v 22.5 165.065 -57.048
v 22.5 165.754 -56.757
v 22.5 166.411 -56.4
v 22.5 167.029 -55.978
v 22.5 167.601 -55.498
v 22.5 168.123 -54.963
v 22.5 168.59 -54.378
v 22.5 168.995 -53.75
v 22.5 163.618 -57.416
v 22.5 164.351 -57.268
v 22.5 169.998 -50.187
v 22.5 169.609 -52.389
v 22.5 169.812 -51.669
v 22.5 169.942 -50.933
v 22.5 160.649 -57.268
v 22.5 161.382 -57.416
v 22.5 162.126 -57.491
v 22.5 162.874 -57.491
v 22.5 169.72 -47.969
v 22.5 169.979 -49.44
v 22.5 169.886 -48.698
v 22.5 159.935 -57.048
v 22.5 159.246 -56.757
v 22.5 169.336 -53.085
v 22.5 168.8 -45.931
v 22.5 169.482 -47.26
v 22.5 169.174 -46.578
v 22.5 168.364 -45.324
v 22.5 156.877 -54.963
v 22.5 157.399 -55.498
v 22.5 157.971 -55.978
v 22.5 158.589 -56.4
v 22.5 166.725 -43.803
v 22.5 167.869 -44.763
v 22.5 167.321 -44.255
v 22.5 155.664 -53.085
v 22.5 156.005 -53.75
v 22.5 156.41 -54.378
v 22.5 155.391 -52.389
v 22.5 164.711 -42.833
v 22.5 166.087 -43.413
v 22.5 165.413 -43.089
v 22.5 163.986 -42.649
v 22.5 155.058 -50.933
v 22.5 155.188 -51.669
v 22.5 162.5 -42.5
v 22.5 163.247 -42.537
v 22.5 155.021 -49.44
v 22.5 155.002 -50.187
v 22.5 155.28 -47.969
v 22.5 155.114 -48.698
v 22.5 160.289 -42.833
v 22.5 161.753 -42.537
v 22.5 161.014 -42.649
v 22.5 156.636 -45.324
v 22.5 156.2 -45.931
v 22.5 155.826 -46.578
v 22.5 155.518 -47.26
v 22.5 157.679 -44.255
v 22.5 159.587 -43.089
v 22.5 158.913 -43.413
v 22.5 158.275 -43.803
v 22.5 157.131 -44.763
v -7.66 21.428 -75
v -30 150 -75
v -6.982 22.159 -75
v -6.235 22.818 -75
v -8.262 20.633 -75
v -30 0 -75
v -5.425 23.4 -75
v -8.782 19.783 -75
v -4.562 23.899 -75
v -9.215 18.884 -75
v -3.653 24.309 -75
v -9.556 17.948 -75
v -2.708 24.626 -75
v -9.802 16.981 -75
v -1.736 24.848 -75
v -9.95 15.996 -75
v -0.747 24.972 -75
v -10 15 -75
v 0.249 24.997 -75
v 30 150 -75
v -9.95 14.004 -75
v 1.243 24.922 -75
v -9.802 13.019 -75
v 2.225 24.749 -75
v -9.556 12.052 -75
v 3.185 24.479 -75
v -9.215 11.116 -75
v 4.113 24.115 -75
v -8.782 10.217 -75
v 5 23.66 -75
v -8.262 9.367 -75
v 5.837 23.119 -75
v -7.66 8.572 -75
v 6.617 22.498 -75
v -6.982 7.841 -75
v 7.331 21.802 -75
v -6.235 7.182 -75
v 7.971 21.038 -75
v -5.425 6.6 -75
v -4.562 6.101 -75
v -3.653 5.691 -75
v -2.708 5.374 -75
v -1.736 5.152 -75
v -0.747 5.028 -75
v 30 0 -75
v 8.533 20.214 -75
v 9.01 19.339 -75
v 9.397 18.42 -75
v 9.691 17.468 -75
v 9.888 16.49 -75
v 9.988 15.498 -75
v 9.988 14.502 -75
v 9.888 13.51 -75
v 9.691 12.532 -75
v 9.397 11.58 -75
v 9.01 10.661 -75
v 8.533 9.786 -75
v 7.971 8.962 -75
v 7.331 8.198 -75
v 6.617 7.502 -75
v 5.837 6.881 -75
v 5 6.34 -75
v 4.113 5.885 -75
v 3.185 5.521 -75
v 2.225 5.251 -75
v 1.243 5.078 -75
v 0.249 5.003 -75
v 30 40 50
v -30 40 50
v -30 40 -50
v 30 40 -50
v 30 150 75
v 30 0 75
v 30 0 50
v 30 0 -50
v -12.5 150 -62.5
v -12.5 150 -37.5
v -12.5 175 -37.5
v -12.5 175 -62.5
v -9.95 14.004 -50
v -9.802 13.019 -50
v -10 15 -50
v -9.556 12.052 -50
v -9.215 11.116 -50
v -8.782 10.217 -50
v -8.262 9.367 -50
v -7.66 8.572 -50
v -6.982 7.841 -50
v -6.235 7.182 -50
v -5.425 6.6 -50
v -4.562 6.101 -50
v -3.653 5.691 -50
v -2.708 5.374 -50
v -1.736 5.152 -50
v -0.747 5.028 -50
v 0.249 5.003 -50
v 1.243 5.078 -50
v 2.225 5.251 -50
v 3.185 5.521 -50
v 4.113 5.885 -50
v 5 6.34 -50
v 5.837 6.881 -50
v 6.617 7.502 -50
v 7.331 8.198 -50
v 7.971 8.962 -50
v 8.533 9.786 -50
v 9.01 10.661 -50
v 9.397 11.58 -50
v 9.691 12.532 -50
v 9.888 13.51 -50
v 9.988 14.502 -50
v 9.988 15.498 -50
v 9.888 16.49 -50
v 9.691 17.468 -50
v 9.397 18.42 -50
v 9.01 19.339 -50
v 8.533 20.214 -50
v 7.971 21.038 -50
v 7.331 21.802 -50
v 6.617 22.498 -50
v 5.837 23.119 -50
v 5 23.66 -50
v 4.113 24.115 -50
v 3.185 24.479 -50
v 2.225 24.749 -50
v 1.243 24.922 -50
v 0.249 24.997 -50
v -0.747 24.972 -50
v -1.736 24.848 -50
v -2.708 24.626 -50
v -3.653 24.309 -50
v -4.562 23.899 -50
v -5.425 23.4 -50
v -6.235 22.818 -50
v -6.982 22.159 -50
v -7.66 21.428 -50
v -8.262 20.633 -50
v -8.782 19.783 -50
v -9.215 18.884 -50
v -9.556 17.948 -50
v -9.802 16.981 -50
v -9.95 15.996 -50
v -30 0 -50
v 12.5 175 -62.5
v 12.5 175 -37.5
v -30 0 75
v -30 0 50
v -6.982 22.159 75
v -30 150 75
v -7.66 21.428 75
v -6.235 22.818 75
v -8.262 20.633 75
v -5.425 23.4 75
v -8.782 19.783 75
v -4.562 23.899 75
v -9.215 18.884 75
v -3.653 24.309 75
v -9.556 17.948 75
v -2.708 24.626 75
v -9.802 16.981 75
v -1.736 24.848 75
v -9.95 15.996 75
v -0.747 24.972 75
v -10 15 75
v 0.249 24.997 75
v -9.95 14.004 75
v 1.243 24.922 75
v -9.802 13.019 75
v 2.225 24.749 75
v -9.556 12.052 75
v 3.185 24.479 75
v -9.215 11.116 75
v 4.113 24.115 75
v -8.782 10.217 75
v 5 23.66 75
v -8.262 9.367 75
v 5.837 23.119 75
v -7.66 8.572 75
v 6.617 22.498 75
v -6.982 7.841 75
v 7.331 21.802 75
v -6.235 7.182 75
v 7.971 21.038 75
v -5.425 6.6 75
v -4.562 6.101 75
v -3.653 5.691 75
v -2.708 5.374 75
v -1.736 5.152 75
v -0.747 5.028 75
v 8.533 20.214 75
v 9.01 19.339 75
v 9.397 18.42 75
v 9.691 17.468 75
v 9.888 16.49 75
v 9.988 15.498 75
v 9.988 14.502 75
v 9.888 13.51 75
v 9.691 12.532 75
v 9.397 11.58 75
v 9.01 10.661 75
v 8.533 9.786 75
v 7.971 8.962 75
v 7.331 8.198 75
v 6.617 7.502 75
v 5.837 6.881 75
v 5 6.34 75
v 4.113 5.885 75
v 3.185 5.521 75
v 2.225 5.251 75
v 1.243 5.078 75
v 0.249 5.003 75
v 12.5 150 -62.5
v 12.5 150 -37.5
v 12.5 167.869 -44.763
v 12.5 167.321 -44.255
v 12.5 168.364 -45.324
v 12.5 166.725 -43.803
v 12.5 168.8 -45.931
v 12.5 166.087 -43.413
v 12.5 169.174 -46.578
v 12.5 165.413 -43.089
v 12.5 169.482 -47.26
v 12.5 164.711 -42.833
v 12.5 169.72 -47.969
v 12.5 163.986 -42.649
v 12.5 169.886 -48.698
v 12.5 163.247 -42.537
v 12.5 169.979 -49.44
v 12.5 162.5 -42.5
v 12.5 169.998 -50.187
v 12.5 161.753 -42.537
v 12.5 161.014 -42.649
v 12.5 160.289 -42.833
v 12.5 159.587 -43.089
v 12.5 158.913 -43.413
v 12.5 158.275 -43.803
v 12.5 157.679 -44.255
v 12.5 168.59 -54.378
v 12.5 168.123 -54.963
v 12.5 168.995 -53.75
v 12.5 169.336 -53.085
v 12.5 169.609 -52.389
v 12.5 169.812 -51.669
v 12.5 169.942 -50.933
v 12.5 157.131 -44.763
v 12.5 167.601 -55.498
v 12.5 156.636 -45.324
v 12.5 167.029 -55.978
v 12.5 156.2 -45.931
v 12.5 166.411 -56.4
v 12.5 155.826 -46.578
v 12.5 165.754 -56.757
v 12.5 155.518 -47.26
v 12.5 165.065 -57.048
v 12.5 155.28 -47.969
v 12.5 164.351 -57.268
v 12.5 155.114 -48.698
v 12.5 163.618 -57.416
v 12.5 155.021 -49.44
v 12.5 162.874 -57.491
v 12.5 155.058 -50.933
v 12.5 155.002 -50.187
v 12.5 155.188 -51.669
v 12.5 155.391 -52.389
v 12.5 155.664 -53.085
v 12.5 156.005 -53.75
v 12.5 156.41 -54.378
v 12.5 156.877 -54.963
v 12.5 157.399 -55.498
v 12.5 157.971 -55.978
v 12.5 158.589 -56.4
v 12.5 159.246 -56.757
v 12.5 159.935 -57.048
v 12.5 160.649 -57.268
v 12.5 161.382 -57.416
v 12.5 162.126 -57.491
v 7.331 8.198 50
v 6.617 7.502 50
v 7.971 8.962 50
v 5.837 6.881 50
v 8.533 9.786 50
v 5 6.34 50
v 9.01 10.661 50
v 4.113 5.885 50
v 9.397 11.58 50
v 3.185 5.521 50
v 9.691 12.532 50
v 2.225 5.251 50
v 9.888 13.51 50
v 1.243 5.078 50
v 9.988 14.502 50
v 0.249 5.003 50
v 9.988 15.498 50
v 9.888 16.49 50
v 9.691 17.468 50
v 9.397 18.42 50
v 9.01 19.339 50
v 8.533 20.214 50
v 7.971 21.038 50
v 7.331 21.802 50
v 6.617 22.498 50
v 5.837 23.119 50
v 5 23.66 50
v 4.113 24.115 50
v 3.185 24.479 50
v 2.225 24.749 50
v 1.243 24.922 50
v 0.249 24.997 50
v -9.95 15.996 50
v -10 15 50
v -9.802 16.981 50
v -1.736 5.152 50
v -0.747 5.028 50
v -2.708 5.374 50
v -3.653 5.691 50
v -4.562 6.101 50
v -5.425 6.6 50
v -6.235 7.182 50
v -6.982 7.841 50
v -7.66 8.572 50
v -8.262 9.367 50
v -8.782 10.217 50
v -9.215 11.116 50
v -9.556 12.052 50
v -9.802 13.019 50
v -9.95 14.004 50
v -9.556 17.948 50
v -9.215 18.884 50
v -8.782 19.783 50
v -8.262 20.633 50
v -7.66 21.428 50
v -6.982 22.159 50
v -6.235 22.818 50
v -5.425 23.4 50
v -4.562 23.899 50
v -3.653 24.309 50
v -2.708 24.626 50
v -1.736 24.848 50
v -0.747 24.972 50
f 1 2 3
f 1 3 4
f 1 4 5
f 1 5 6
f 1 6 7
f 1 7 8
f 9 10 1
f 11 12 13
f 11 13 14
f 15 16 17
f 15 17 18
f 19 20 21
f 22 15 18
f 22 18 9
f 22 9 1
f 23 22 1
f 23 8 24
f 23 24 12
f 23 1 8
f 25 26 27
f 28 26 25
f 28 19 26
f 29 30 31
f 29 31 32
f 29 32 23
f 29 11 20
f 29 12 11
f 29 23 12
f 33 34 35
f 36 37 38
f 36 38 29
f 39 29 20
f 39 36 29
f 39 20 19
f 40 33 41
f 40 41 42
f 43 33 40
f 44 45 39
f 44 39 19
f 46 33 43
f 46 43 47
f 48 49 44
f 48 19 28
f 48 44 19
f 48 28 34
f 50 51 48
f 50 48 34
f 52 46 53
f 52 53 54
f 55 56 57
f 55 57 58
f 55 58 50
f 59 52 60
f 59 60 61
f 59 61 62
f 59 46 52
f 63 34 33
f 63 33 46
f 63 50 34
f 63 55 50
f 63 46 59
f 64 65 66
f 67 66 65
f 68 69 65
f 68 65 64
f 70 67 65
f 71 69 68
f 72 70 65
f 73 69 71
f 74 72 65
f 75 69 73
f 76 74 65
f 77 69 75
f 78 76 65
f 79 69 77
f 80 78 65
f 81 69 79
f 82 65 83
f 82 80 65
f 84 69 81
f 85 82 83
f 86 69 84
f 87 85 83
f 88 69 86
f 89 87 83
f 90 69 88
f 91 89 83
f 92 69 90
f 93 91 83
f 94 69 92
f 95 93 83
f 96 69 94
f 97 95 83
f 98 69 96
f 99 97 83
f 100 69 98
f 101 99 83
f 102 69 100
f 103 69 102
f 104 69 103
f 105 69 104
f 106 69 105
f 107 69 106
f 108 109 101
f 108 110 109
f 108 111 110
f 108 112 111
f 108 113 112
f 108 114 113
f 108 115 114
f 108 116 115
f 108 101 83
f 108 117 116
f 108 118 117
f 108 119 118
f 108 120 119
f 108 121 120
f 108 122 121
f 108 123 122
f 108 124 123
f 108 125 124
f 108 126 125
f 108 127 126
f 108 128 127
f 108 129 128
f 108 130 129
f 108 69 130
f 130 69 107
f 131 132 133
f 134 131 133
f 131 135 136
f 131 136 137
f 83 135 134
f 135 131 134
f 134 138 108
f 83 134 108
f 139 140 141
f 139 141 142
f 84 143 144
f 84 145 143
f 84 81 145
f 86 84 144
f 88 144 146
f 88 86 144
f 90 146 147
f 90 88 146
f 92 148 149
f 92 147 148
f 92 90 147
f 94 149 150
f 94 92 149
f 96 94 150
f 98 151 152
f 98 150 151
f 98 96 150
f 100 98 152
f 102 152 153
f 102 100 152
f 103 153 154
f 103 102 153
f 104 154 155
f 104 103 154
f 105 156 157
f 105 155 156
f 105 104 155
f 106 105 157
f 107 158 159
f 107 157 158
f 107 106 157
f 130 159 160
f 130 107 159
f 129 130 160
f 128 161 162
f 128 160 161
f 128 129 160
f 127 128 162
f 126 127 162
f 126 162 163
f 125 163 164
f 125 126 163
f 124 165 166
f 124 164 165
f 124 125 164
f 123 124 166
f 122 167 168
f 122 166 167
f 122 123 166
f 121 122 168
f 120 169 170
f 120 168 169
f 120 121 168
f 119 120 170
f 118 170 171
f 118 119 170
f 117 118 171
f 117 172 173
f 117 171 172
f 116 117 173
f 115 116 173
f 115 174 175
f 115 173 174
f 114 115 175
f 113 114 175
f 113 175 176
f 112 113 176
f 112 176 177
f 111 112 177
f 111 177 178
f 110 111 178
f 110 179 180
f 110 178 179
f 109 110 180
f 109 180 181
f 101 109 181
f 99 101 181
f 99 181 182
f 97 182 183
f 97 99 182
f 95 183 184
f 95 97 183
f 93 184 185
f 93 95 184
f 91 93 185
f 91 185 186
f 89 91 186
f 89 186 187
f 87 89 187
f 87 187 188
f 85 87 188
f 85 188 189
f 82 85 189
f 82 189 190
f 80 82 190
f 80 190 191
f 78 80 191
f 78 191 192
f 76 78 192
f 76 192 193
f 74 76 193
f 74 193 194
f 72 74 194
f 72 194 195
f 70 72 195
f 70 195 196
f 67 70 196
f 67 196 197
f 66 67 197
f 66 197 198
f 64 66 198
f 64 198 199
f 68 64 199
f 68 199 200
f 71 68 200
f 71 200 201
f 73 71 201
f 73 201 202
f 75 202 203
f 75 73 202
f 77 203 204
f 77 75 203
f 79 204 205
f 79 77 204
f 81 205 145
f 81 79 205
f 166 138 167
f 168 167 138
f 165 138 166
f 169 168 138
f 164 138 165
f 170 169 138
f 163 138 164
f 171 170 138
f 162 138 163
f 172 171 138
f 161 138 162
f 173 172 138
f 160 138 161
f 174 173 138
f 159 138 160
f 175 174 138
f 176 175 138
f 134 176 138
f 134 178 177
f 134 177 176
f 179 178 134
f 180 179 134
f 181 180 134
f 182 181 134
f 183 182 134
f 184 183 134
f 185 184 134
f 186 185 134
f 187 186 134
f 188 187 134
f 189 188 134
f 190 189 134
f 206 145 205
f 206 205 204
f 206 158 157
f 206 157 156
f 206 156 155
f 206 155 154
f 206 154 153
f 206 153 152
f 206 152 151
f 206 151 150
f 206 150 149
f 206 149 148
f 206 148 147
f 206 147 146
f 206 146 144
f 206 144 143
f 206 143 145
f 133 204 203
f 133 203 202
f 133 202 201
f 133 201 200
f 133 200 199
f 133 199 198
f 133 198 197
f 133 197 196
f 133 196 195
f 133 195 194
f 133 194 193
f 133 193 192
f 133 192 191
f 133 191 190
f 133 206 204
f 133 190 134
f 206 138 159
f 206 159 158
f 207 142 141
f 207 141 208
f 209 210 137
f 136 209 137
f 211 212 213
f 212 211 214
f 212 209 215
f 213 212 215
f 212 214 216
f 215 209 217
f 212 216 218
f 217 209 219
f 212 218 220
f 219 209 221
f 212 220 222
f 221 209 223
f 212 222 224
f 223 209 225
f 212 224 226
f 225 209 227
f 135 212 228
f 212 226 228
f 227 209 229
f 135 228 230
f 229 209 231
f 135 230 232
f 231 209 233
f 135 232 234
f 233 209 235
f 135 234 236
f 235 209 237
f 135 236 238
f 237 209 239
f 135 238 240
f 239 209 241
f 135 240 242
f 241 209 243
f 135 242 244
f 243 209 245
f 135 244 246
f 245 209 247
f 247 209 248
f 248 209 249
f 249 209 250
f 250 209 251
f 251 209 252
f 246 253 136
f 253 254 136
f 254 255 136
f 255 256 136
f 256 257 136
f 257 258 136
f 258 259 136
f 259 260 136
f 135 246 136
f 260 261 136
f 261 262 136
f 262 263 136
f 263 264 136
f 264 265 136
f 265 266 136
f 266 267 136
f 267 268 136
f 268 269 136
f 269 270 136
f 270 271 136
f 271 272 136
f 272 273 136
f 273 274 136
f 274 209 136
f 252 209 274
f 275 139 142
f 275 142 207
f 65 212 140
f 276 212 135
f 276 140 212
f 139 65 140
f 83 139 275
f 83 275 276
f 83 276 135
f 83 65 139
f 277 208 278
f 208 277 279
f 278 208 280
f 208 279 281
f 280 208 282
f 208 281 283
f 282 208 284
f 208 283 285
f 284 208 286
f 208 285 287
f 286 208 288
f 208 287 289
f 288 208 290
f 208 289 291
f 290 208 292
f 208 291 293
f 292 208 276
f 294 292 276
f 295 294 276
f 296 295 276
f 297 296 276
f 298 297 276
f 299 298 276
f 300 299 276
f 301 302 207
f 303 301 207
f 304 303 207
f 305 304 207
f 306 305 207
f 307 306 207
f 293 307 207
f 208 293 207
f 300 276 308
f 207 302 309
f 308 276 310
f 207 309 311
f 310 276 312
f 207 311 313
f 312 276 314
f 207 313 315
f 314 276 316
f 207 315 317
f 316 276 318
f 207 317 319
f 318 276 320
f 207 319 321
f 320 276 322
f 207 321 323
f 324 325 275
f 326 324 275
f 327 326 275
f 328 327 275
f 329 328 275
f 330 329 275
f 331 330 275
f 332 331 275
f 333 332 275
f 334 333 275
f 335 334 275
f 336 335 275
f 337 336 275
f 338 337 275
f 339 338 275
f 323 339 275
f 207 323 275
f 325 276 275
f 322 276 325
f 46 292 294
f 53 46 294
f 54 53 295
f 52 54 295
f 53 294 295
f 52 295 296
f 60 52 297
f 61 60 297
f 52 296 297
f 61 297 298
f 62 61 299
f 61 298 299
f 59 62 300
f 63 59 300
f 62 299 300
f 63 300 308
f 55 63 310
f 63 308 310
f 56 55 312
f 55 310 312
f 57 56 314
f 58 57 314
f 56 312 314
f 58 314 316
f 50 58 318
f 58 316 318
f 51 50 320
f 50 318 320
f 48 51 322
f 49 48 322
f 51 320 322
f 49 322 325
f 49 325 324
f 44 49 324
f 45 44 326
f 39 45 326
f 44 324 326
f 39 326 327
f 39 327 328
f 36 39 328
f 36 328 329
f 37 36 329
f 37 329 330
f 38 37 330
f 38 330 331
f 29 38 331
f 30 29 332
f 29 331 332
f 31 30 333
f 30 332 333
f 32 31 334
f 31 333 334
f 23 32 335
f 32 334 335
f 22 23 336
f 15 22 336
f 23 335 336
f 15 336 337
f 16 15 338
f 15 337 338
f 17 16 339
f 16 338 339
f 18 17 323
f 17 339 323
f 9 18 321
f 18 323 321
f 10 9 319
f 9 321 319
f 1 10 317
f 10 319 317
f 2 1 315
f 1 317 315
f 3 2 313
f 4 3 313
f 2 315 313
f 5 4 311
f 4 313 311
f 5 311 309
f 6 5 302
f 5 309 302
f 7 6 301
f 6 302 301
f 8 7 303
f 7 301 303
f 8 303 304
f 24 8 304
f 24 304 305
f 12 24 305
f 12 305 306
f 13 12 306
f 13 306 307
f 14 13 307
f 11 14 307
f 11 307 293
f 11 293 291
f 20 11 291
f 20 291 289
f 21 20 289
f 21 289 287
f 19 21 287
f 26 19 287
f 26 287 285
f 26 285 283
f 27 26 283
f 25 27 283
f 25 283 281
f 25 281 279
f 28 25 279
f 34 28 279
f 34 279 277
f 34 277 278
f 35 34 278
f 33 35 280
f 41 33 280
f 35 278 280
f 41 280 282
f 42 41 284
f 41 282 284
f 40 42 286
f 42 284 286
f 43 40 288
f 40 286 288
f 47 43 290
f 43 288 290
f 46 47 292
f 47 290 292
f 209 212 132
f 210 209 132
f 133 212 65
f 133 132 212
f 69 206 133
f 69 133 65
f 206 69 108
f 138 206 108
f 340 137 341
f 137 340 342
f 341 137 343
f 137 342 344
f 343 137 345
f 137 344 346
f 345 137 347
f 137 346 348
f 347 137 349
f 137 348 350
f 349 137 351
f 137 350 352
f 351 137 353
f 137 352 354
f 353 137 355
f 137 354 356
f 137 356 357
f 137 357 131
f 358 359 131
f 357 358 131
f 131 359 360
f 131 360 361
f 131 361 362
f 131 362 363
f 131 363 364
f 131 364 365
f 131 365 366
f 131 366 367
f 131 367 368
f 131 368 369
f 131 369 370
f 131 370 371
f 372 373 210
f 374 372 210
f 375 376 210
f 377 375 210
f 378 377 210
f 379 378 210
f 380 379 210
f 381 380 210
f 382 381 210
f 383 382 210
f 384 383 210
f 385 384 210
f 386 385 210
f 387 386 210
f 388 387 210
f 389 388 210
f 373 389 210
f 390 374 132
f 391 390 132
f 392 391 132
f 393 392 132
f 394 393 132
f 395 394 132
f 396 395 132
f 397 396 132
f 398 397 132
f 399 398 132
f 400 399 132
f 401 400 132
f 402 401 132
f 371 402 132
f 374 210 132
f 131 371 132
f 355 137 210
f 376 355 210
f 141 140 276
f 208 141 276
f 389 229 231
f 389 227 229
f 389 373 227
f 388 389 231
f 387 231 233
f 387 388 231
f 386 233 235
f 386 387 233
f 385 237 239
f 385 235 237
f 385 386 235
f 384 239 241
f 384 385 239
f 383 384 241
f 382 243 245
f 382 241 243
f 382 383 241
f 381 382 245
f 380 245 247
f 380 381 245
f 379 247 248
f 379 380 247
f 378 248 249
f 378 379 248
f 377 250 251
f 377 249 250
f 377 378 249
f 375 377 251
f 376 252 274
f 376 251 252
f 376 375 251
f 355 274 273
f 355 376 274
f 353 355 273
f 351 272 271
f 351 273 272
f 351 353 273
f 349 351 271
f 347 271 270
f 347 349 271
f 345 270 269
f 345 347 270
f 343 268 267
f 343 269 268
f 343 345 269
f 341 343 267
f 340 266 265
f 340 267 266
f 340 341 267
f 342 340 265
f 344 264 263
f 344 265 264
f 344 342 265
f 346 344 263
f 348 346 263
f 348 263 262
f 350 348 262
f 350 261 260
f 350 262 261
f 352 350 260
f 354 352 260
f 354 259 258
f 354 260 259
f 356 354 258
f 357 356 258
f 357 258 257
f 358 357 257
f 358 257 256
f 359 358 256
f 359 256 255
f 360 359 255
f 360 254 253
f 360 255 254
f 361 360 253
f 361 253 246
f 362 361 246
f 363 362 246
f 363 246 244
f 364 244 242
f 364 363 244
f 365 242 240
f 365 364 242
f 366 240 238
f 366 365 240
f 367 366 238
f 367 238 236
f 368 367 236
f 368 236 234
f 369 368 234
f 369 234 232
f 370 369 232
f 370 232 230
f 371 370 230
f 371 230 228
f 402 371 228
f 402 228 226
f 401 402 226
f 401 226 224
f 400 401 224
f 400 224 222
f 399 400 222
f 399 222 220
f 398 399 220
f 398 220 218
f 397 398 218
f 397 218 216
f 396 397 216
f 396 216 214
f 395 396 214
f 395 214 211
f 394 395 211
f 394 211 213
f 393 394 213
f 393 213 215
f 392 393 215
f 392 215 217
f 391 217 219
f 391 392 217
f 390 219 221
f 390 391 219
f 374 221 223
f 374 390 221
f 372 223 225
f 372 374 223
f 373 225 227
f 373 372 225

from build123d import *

# Parameters (mm, degrees)
SKETCH1_W               = 60
SKETCH1_H               = 150
BOSS_EXTRUDE1_DEPTH     = 150
CUT_EXTRUDE1_DEPTH      = 100
CUT_EXTRUDE1_DEPTH_BACK = 100
SKETCH2_R               = 10
CUT_EXTRUDE2_DEPTH      = 100
CUT_EXTRUDE2_DEPTH_BACK = 100
SKETCH3_W               = 100
SKETCH3_H               = 80
SKETCH5_W               = 25
SKETCH5_H               = 25
BOSS_EXTRUDE3_DEPTH     = 25
SKETCH6_R               = 7.5
BOSS_EXTRUDE4_DEPTH     = 10


with BuildPart() as part:
    # Sketch1 → Boss-Extrude1 (new body)
    with BuildSketch(Plane(origin=(0, 0, 0), x_dir=(1, 0, 0), z_dir=(0, 1, 0))):
        Rectangle(SKETCH1_W, SKETCH1_H)
    extrude(amount=BOSS_EXTRUDE1_DEPTH)

    # Sketch2 → Cut-Extrude1 (cut, two sides: drawn at the far end of the back side and taken through both)
    with BuildSketch(Plane.XY.offset(-CUT_EXTRUDE1_DEPTH_BACK)):
        with Locations((0, 15)):
            Circle(SKETCH2_R)
    extrude(amount=CUT_EXTRUDE1_DEPTH + CUT_EXTRUDE1_DEPTH_BACK, mode=Mode.SUBTRACT)

    # Sketch3 → Cut-Extrude2 (cut, two sides: drawn at the far end of the back side and taken through both)
    with BuildSketch(Plane(origin=(0, 0, 0), x_dir=(0, 0, -1), z_dir=(1, 0, 0)).offset(-CUT_EXTRUDE2_DEPTH_BACK)):
        Rectangle(SKETCH3_W, SKETCH3_H)
    extrude(amount=CUT_EXTRUDE2_DEPTH + CUT_EXTRUDE2_DEPTH_BACK, mode=Mode.SUBTRACT)

    # Sketch5 → Boss-Extrude3 (add)
    with BuildSketch(Plane(origin=(0, 150, 0), x_dir=(1, 0, 0), z_dir=(0, 1, 0))):
        with Locations((0, 50)):
            Rectangle(SKETCH5_W, SKETCH5_H)
    extrude(amount=BOSS_EXTRUDE3_DEPTH)

    # Sketch6 → Boss-Extrude4 (add)
    with BuildSketch(Plane(origin=(12.5, 0, 0), x_dir=(0, 0, -1), z_dir=(1, 0, 0))):
        with Locations((50, 162.5)):
            Circle(SKETCH6_R)
    extrude(amount=BOSS_EXTRUDE4_DEPTH)


solid = part.part
